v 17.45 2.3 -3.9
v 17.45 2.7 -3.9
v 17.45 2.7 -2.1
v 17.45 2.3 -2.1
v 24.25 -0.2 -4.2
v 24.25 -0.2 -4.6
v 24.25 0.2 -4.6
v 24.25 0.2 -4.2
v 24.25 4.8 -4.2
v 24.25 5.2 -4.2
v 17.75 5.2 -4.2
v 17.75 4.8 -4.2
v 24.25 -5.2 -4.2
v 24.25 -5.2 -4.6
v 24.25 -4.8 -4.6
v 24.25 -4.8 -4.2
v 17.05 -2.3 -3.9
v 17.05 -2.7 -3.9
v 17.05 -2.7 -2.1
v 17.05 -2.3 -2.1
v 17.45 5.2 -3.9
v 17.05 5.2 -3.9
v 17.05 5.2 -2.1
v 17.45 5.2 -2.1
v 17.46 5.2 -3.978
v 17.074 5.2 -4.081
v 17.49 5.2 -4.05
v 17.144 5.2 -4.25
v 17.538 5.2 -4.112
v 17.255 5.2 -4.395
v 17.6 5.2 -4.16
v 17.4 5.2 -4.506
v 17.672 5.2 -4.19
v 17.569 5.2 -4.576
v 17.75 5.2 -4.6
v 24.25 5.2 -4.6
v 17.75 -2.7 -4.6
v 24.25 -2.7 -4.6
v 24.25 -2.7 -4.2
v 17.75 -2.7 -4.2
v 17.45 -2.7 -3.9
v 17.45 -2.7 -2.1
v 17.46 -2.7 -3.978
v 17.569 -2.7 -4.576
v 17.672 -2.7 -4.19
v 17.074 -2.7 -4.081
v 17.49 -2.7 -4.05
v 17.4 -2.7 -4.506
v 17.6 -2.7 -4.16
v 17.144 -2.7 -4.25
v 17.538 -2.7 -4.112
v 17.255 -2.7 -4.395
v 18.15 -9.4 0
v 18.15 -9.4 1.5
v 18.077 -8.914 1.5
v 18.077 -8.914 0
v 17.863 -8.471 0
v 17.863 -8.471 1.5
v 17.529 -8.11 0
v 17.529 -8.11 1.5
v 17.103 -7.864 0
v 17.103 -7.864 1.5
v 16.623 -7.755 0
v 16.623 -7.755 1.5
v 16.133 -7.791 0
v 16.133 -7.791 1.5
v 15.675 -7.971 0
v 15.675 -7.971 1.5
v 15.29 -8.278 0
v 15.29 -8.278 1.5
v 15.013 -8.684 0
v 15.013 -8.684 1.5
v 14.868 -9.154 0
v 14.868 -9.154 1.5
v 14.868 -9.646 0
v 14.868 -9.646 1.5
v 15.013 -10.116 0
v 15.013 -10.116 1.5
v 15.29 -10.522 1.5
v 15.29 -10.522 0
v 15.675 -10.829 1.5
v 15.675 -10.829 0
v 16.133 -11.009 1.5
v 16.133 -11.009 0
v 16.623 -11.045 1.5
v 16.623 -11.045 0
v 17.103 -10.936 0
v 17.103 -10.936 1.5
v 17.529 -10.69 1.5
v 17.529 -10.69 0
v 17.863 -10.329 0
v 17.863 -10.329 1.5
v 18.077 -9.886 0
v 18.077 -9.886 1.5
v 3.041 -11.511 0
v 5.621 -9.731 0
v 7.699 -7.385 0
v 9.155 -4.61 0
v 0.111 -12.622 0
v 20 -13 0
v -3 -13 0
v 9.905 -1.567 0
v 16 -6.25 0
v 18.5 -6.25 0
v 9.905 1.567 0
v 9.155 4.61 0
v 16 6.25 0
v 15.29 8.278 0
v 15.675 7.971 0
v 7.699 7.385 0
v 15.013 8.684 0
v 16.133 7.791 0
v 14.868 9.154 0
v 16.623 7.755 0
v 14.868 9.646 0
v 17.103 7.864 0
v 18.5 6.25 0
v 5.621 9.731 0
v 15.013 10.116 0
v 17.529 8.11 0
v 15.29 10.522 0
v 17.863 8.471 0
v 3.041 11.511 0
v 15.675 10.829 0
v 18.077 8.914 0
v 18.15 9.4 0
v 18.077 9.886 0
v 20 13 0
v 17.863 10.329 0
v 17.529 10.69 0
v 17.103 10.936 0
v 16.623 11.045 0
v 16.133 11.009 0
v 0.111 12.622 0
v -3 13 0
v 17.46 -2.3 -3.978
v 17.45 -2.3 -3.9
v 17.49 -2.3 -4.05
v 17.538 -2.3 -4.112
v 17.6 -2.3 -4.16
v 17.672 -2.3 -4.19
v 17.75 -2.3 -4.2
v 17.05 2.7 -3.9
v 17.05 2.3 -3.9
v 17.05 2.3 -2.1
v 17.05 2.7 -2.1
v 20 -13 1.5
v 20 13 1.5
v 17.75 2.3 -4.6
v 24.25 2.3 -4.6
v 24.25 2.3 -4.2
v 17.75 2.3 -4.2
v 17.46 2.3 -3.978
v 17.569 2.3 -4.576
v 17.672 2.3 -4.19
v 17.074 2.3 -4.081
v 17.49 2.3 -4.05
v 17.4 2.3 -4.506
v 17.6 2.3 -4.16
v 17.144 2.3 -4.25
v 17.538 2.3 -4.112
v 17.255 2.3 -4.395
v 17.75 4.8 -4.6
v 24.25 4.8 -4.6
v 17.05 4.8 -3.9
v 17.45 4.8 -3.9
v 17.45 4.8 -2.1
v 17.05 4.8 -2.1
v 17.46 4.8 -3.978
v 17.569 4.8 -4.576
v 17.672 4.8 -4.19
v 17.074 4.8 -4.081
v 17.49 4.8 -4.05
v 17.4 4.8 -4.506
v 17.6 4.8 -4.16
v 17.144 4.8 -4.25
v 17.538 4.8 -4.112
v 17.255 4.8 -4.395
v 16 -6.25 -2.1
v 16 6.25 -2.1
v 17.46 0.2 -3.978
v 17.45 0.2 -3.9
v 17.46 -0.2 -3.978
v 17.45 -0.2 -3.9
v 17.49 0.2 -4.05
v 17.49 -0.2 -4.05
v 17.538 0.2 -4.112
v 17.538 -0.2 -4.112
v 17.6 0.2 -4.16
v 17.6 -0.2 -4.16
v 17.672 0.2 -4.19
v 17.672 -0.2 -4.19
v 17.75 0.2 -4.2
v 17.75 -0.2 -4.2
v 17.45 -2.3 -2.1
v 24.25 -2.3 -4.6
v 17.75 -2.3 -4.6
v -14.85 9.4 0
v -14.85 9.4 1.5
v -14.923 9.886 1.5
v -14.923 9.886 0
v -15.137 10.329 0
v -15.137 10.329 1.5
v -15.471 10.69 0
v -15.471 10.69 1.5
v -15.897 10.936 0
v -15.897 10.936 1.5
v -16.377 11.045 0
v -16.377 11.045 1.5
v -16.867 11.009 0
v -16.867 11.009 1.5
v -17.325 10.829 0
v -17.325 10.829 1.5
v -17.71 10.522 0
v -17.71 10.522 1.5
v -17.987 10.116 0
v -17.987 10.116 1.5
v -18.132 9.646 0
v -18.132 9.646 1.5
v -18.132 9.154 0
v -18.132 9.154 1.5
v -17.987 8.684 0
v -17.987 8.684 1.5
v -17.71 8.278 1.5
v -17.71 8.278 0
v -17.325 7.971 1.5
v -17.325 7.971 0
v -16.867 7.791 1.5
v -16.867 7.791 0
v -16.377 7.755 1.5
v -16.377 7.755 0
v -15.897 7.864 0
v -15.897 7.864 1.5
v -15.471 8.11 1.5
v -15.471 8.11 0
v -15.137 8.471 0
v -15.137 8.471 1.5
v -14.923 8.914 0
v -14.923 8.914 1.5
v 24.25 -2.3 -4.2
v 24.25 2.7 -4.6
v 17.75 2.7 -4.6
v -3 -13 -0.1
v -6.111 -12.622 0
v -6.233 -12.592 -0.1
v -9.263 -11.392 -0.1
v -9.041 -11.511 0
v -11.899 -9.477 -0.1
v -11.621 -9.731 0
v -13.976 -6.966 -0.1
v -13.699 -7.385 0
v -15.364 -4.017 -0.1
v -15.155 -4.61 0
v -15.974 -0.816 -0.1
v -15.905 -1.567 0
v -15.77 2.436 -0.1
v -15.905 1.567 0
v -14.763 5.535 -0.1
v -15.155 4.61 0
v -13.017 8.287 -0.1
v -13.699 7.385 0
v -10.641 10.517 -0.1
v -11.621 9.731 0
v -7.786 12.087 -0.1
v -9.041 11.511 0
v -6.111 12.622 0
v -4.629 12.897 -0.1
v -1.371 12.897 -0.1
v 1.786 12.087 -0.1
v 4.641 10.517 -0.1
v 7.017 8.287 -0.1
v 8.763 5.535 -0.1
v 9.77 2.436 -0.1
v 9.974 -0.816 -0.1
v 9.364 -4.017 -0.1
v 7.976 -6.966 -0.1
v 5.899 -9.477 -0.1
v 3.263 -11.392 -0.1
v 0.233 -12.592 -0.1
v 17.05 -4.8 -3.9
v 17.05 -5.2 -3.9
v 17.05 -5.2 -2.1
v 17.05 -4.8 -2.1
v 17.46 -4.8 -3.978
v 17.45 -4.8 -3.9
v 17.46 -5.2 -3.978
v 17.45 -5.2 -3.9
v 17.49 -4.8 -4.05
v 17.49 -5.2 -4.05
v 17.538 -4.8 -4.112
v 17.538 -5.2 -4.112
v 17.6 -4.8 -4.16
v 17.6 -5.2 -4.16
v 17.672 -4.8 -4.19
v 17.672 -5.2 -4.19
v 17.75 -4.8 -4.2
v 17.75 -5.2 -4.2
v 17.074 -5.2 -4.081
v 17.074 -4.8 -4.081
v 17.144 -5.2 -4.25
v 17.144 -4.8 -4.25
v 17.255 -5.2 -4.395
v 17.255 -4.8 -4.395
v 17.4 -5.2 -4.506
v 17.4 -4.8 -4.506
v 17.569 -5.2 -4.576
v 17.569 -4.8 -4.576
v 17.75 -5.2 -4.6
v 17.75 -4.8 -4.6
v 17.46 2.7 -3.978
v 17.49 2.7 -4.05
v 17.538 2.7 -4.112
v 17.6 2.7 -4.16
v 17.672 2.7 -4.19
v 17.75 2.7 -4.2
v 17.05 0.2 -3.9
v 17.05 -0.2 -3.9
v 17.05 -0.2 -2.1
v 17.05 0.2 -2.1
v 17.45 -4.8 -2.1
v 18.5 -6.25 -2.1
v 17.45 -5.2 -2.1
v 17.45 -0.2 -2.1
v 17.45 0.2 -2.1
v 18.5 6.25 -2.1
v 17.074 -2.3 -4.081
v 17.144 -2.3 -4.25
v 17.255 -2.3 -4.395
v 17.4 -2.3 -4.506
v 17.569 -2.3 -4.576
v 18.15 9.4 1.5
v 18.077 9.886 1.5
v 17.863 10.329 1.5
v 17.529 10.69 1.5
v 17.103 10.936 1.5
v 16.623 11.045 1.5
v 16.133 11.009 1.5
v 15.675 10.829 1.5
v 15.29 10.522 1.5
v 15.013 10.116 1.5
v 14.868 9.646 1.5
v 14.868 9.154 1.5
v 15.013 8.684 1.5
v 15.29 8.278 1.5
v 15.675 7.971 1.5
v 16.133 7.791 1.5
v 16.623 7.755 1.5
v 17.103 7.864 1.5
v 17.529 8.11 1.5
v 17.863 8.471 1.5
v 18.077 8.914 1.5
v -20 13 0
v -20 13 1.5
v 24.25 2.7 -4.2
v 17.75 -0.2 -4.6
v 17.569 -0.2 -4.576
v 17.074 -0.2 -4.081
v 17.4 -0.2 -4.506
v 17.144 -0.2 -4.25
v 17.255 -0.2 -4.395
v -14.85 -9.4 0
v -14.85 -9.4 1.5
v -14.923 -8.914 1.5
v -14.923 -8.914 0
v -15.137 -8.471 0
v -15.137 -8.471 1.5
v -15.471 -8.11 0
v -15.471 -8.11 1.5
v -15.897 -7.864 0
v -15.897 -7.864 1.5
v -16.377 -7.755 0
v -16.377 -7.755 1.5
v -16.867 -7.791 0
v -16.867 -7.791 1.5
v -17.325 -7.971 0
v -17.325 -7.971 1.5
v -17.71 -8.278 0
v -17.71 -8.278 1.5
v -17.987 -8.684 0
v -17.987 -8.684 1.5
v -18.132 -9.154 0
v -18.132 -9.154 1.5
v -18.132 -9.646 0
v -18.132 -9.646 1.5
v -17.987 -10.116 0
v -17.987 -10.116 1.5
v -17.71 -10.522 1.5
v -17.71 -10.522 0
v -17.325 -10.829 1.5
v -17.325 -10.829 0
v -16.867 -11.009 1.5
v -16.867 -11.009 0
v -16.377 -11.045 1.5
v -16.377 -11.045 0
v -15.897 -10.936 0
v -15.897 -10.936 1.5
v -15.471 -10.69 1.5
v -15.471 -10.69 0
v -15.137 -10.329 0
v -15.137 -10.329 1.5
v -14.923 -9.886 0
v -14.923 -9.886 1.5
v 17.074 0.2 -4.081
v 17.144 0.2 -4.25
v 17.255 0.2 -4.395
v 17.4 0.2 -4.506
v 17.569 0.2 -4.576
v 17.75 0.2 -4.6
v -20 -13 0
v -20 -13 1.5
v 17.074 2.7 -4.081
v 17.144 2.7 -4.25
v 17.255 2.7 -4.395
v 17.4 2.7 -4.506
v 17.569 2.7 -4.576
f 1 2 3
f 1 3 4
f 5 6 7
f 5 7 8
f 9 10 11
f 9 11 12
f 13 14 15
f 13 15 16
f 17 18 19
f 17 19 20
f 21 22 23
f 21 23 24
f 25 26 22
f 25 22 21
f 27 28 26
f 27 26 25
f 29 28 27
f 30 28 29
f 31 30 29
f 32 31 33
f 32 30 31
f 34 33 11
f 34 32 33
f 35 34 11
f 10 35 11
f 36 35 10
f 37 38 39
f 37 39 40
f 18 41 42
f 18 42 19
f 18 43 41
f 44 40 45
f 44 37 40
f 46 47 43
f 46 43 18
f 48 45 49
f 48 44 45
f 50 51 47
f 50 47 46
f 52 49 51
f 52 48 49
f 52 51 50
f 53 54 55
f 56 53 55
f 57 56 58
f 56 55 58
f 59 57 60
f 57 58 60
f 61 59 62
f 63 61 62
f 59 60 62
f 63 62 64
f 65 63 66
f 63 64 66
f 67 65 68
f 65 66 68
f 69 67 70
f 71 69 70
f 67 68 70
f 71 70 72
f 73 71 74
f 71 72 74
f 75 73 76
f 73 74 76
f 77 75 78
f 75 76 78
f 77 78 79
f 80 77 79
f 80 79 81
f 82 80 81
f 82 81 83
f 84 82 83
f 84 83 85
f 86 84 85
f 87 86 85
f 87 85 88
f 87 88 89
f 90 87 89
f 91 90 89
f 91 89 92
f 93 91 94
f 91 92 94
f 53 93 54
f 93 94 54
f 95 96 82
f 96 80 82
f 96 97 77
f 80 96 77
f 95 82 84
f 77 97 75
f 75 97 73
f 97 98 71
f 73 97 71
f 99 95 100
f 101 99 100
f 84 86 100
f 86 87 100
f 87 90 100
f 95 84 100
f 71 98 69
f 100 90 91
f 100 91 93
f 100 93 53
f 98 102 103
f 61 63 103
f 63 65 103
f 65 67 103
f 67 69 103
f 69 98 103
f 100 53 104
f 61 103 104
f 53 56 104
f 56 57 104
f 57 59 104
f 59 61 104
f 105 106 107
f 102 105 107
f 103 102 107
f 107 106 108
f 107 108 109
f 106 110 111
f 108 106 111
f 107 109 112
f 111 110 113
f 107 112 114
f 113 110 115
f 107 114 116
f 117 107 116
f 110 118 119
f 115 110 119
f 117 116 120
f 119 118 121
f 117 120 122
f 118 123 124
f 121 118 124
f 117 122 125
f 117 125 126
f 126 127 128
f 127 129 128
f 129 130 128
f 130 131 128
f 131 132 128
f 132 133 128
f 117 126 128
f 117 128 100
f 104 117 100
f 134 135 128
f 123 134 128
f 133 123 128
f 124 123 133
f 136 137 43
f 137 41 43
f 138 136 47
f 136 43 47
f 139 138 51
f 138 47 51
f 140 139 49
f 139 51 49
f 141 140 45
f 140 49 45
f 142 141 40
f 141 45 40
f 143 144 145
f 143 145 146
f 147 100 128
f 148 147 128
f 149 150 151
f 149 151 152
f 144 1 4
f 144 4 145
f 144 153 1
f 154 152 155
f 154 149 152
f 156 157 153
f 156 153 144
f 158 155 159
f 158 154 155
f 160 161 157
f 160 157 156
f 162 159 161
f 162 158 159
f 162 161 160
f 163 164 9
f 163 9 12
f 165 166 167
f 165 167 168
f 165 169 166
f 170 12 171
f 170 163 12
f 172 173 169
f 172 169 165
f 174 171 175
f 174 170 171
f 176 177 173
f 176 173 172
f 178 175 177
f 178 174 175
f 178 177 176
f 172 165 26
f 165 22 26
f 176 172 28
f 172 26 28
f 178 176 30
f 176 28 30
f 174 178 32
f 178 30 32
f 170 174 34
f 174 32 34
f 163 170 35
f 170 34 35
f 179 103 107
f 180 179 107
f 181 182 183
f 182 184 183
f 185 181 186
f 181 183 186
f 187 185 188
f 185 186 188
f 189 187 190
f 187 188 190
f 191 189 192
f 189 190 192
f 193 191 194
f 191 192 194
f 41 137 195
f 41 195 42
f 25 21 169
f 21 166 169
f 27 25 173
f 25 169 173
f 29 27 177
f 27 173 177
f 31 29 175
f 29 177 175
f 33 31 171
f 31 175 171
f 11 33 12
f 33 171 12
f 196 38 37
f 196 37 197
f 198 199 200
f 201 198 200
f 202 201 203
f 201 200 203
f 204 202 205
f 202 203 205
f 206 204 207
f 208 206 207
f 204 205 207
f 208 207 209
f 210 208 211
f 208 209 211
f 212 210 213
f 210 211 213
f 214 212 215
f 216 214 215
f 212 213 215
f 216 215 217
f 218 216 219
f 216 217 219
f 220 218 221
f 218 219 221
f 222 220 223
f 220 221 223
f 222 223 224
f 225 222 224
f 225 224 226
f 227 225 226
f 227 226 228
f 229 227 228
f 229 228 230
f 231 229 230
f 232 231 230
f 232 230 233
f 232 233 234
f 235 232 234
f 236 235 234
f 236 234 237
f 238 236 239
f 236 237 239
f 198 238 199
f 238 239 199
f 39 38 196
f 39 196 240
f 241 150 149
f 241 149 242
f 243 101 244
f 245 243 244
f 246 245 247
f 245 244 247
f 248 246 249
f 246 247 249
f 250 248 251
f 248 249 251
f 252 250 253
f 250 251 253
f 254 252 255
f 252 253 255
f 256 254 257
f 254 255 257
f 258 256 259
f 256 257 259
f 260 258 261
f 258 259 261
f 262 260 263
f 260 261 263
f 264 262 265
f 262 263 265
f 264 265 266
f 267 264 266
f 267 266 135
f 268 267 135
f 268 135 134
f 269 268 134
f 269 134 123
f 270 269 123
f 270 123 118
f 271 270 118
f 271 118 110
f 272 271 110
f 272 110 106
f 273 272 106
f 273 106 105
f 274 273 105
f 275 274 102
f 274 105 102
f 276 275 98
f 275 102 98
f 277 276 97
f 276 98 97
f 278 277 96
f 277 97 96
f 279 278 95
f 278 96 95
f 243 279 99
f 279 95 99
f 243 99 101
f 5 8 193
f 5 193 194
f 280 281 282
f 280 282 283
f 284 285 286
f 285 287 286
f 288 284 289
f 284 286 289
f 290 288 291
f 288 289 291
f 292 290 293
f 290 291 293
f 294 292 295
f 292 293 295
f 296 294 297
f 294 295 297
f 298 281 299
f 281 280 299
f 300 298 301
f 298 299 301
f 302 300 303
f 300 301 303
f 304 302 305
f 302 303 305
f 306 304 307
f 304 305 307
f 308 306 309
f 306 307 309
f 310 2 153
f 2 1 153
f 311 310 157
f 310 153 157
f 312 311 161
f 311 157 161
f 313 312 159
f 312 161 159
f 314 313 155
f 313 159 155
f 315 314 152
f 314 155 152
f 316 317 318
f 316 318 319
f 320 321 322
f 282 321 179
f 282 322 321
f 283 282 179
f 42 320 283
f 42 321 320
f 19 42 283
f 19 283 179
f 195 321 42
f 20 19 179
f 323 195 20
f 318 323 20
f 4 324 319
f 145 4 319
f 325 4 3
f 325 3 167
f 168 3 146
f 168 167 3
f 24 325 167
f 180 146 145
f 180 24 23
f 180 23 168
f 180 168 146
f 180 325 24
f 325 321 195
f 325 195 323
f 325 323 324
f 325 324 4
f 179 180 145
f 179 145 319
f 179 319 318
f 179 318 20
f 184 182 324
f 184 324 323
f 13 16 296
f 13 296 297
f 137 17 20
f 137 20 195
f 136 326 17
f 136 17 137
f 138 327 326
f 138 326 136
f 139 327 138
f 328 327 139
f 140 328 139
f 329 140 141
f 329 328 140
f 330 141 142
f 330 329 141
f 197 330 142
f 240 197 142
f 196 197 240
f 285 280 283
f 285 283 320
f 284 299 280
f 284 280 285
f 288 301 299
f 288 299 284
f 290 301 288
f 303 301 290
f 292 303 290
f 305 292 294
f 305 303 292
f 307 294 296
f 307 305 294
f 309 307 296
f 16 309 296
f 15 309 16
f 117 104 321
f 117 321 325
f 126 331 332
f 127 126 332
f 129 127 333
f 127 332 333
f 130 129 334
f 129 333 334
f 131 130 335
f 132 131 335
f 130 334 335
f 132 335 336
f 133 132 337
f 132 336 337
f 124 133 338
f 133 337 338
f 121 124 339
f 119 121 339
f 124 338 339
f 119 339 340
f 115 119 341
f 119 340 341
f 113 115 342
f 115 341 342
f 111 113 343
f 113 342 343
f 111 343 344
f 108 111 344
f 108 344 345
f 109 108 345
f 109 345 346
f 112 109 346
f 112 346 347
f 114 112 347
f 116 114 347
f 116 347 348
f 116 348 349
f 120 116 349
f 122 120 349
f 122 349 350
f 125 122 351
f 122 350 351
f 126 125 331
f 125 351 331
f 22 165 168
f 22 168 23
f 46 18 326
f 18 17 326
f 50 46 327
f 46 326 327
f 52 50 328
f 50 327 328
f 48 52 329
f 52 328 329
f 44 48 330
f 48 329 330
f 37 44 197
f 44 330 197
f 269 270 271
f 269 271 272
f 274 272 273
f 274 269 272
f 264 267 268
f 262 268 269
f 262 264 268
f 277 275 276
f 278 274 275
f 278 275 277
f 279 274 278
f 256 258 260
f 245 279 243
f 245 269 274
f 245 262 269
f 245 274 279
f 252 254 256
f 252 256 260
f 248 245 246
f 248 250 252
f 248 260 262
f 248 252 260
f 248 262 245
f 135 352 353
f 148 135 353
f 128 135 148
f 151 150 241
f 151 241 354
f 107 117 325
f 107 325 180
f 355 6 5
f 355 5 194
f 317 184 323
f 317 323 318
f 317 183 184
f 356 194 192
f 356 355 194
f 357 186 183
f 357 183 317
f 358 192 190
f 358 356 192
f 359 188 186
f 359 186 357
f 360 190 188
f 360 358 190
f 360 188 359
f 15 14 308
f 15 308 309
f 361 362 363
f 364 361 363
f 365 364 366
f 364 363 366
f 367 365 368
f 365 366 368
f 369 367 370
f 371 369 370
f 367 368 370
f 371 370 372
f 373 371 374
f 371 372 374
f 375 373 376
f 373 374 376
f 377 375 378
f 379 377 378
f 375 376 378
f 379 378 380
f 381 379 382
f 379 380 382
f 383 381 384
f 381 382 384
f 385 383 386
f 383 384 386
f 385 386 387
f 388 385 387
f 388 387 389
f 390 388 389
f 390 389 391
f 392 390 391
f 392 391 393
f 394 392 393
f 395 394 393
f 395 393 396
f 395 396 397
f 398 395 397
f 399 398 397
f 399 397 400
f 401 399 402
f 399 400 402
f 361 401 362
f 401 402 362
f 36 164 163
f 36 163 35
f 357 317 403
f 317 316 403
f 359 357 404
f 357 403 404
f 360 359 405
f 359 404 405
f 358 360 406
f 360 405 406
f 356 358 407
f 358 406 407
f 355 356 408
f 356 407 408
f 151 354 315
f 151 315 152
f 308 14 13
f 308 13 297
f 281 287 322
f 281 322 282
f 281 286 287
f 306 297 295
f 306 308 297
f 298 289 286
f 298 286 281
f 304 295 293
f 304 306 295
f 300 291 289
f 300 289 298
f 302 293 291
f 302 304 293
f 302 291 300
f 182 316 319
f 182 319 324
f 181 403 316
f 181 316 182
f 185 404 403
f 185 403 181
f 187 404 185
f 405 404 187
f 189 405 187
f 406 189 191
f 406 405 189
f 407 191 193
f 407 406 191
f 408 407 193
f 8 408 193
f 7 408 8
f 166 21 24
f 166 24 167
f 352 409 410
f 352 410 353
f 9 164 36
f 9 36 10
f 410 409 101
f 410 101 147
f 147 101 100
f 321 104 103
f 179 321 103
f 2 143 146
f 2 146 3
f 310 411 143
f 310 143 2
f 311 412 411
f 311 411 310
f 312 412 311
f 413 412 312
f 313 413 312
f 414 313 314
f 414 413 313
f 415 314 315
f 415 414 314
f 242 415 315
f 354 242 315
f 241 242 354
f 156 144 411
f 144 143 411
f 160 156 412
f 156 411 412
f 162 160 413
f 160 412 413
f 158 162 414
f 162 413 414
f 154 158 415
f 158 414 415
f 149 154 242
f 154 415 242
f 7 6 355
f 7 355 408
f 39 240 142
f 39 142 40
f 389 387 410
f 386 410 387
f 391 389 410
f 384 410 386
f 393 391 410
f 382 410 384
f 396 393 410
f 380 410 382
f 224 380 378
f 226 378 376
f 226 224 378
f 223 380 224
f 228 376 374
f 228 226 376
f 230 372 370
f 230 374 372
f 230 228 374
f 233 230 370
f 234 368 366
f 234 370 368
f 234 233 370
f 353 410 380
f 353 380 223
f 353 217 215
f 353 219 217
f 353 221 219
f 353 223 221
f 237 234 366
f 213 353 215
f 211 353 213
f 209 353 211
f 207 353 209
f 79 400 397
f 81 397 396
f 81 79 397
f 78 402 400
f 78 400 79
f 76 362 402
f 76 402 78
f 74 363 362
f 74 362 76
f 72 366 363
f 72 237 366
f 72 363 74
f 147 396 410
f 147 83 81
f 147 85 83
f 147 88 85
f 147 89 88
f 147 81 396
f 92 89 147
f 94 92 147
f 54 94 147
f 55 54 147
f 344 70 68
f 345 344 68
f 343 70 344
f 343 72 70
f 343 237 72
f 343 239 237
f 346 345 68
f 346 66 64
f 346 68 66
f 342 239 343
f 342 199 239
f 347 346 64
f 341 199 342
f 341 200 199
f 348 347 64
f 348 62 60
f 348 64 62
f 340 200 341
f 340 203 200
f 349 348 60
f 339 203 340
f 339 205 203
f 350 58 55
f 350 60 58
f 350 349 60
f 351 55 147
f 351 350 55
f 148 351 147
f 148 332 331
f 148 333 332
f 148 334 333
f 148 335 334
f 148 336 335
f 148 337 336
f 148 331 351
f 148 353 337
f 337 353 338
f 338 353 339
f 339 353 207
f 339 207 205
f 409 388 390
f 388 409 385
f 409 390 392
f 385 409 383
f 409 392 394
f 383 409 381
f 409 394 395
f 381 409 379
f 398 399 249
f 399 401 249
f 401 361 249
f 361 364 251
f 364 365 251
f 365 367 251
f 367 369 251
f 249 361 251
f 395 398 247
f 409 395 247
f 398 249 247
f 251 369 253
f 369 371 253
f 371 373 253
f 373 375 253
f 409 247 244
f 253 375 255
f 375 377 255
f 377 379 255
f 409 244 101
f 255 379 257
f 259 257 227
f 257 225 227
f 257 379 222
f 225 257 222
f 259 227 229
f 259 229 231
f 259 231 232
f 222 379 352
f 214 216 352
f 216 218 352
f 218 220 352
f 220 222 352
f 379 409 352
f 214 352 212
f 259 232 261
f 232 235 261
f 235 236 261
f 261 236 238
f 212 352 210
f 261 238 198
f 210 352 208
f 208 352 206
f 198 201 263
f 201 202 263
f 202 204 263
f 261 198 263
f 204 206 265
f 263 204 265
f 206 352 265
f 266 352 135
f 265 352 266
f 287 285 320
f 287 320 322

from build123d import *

# Parameters (mm, degrees)
SKETCH_1_W          = 40
SKETCH_1_H          = 26
EXTRUDE_1_DEPTH     = 1.5
SKETCH_2_R          = 1.65
CUT_EXTRUDE_1_DEPTH = 1.5
SKETCH_3_R          = 13
EXTRUDE_2_DEPTH     = 0.1
SKETCH_4_W          = 2.5
SKETCH_4_H          = 12.5
EXTRUDE_3_DEPTH     = 2.1
SKETCH_5_W          = 0.4
SKETCH_5_H          = 0.4


with BuildPart() as part:
    # 草图1 → 凸台-拉伸1 (new body)
    with BuildSketch(Plane.XY):
        Rectangle(SKETCH_1_W, SKETCH_1_H)
    extrude(amount=EXTRUDE_1_DEPTH)

    # 草图2 → 切除-拉伸1 (cut)
    with BuildSketch(Plane.XY.offset(1.5)):
        with Locations((-16.5, 9.4)):
            Circle(SKETCH_2_R)
        with Locations((16.5, 9.4)):
            Circle(SKETCH_2_R)
        with Locations((16.5, -9.4)):
            Circle(SKETCH_2_R)
        with Locations((-16.5, -9.4)):
            Circle(SKETCH_2_R)
    extrude(amount=-CUT_EXTRUDE_1_DEPTH, mode=Mode.SUBTRACT)

    # 草图3 → 凸台-拉伸2 (add)
    with BuildSketch(Plane(origin=(0, 0, 0), x_dir=(-1, 0, 0), z_dir=(0, 0, -1))):
        with Locations(Location((3, 0, 0), (0, 0, 270))):
            Circle(SKETCH_3_R)
    extrude(amount=EXTRUDE_2_DEPTH)

    # 草图4 → 凸台-拉伸3 (add)
    with BuildSketch(Plane(origin=(0, 0, 0), x_dir=(-1, 0, 0), z_dir=(0, 0, -1))):
        with Locations((-17.25, 0)):
            Rectangle(SKETCH_4_W, SKETCH_4_H)
    extrude(amount=EXTRUDE_3_DEPTH)

    # 扫描1: sweep along a path in 草图6
    with BuildLine(Plane(origin=(0, 5.2, 0), x_dir=(-1, 0, 0), z_dir=(0, -1, 0))) as sweep_1_path:
        Line((-17.25, 2.1), (-17.25, 3.9))
        ThreePointArc((-17.25, 3.9), (-17.396446609, 4.253553391), (-17.75, 4.4))
        Line((-17.75, 4.4), (-24.25, 4.4))
    # 草图5 → 扫描1 (sweep)
    with BuildSketch(Plane(origin=(0, 0, -2.1), x_dir=(-1, 0, 0), z_dir=(0, 0, -1))):
        with Locations((-17.25, 2.5)):
            Rectangle(SKETCH_5_W, SKETCH_5_H)
        with Locations((-17.25, 5)):
            Rectangle(SKETCH_5_W, SKETCH_5_H)
        with Locations((-17.25, 0)):
            Rectangle(SKETCH_5_W, SKETCH_5_H)
        with Locations((-17.25, -2.5)):
            Rectangle(SKETCH_5_W, SKETCH_5_H)
        with Locations((-17.25, -5)):
            Rectangle(SKETCH_5_W, SKETCH_5_H)
    sweep(path=sweep_1_path.line)


solid = part.part
